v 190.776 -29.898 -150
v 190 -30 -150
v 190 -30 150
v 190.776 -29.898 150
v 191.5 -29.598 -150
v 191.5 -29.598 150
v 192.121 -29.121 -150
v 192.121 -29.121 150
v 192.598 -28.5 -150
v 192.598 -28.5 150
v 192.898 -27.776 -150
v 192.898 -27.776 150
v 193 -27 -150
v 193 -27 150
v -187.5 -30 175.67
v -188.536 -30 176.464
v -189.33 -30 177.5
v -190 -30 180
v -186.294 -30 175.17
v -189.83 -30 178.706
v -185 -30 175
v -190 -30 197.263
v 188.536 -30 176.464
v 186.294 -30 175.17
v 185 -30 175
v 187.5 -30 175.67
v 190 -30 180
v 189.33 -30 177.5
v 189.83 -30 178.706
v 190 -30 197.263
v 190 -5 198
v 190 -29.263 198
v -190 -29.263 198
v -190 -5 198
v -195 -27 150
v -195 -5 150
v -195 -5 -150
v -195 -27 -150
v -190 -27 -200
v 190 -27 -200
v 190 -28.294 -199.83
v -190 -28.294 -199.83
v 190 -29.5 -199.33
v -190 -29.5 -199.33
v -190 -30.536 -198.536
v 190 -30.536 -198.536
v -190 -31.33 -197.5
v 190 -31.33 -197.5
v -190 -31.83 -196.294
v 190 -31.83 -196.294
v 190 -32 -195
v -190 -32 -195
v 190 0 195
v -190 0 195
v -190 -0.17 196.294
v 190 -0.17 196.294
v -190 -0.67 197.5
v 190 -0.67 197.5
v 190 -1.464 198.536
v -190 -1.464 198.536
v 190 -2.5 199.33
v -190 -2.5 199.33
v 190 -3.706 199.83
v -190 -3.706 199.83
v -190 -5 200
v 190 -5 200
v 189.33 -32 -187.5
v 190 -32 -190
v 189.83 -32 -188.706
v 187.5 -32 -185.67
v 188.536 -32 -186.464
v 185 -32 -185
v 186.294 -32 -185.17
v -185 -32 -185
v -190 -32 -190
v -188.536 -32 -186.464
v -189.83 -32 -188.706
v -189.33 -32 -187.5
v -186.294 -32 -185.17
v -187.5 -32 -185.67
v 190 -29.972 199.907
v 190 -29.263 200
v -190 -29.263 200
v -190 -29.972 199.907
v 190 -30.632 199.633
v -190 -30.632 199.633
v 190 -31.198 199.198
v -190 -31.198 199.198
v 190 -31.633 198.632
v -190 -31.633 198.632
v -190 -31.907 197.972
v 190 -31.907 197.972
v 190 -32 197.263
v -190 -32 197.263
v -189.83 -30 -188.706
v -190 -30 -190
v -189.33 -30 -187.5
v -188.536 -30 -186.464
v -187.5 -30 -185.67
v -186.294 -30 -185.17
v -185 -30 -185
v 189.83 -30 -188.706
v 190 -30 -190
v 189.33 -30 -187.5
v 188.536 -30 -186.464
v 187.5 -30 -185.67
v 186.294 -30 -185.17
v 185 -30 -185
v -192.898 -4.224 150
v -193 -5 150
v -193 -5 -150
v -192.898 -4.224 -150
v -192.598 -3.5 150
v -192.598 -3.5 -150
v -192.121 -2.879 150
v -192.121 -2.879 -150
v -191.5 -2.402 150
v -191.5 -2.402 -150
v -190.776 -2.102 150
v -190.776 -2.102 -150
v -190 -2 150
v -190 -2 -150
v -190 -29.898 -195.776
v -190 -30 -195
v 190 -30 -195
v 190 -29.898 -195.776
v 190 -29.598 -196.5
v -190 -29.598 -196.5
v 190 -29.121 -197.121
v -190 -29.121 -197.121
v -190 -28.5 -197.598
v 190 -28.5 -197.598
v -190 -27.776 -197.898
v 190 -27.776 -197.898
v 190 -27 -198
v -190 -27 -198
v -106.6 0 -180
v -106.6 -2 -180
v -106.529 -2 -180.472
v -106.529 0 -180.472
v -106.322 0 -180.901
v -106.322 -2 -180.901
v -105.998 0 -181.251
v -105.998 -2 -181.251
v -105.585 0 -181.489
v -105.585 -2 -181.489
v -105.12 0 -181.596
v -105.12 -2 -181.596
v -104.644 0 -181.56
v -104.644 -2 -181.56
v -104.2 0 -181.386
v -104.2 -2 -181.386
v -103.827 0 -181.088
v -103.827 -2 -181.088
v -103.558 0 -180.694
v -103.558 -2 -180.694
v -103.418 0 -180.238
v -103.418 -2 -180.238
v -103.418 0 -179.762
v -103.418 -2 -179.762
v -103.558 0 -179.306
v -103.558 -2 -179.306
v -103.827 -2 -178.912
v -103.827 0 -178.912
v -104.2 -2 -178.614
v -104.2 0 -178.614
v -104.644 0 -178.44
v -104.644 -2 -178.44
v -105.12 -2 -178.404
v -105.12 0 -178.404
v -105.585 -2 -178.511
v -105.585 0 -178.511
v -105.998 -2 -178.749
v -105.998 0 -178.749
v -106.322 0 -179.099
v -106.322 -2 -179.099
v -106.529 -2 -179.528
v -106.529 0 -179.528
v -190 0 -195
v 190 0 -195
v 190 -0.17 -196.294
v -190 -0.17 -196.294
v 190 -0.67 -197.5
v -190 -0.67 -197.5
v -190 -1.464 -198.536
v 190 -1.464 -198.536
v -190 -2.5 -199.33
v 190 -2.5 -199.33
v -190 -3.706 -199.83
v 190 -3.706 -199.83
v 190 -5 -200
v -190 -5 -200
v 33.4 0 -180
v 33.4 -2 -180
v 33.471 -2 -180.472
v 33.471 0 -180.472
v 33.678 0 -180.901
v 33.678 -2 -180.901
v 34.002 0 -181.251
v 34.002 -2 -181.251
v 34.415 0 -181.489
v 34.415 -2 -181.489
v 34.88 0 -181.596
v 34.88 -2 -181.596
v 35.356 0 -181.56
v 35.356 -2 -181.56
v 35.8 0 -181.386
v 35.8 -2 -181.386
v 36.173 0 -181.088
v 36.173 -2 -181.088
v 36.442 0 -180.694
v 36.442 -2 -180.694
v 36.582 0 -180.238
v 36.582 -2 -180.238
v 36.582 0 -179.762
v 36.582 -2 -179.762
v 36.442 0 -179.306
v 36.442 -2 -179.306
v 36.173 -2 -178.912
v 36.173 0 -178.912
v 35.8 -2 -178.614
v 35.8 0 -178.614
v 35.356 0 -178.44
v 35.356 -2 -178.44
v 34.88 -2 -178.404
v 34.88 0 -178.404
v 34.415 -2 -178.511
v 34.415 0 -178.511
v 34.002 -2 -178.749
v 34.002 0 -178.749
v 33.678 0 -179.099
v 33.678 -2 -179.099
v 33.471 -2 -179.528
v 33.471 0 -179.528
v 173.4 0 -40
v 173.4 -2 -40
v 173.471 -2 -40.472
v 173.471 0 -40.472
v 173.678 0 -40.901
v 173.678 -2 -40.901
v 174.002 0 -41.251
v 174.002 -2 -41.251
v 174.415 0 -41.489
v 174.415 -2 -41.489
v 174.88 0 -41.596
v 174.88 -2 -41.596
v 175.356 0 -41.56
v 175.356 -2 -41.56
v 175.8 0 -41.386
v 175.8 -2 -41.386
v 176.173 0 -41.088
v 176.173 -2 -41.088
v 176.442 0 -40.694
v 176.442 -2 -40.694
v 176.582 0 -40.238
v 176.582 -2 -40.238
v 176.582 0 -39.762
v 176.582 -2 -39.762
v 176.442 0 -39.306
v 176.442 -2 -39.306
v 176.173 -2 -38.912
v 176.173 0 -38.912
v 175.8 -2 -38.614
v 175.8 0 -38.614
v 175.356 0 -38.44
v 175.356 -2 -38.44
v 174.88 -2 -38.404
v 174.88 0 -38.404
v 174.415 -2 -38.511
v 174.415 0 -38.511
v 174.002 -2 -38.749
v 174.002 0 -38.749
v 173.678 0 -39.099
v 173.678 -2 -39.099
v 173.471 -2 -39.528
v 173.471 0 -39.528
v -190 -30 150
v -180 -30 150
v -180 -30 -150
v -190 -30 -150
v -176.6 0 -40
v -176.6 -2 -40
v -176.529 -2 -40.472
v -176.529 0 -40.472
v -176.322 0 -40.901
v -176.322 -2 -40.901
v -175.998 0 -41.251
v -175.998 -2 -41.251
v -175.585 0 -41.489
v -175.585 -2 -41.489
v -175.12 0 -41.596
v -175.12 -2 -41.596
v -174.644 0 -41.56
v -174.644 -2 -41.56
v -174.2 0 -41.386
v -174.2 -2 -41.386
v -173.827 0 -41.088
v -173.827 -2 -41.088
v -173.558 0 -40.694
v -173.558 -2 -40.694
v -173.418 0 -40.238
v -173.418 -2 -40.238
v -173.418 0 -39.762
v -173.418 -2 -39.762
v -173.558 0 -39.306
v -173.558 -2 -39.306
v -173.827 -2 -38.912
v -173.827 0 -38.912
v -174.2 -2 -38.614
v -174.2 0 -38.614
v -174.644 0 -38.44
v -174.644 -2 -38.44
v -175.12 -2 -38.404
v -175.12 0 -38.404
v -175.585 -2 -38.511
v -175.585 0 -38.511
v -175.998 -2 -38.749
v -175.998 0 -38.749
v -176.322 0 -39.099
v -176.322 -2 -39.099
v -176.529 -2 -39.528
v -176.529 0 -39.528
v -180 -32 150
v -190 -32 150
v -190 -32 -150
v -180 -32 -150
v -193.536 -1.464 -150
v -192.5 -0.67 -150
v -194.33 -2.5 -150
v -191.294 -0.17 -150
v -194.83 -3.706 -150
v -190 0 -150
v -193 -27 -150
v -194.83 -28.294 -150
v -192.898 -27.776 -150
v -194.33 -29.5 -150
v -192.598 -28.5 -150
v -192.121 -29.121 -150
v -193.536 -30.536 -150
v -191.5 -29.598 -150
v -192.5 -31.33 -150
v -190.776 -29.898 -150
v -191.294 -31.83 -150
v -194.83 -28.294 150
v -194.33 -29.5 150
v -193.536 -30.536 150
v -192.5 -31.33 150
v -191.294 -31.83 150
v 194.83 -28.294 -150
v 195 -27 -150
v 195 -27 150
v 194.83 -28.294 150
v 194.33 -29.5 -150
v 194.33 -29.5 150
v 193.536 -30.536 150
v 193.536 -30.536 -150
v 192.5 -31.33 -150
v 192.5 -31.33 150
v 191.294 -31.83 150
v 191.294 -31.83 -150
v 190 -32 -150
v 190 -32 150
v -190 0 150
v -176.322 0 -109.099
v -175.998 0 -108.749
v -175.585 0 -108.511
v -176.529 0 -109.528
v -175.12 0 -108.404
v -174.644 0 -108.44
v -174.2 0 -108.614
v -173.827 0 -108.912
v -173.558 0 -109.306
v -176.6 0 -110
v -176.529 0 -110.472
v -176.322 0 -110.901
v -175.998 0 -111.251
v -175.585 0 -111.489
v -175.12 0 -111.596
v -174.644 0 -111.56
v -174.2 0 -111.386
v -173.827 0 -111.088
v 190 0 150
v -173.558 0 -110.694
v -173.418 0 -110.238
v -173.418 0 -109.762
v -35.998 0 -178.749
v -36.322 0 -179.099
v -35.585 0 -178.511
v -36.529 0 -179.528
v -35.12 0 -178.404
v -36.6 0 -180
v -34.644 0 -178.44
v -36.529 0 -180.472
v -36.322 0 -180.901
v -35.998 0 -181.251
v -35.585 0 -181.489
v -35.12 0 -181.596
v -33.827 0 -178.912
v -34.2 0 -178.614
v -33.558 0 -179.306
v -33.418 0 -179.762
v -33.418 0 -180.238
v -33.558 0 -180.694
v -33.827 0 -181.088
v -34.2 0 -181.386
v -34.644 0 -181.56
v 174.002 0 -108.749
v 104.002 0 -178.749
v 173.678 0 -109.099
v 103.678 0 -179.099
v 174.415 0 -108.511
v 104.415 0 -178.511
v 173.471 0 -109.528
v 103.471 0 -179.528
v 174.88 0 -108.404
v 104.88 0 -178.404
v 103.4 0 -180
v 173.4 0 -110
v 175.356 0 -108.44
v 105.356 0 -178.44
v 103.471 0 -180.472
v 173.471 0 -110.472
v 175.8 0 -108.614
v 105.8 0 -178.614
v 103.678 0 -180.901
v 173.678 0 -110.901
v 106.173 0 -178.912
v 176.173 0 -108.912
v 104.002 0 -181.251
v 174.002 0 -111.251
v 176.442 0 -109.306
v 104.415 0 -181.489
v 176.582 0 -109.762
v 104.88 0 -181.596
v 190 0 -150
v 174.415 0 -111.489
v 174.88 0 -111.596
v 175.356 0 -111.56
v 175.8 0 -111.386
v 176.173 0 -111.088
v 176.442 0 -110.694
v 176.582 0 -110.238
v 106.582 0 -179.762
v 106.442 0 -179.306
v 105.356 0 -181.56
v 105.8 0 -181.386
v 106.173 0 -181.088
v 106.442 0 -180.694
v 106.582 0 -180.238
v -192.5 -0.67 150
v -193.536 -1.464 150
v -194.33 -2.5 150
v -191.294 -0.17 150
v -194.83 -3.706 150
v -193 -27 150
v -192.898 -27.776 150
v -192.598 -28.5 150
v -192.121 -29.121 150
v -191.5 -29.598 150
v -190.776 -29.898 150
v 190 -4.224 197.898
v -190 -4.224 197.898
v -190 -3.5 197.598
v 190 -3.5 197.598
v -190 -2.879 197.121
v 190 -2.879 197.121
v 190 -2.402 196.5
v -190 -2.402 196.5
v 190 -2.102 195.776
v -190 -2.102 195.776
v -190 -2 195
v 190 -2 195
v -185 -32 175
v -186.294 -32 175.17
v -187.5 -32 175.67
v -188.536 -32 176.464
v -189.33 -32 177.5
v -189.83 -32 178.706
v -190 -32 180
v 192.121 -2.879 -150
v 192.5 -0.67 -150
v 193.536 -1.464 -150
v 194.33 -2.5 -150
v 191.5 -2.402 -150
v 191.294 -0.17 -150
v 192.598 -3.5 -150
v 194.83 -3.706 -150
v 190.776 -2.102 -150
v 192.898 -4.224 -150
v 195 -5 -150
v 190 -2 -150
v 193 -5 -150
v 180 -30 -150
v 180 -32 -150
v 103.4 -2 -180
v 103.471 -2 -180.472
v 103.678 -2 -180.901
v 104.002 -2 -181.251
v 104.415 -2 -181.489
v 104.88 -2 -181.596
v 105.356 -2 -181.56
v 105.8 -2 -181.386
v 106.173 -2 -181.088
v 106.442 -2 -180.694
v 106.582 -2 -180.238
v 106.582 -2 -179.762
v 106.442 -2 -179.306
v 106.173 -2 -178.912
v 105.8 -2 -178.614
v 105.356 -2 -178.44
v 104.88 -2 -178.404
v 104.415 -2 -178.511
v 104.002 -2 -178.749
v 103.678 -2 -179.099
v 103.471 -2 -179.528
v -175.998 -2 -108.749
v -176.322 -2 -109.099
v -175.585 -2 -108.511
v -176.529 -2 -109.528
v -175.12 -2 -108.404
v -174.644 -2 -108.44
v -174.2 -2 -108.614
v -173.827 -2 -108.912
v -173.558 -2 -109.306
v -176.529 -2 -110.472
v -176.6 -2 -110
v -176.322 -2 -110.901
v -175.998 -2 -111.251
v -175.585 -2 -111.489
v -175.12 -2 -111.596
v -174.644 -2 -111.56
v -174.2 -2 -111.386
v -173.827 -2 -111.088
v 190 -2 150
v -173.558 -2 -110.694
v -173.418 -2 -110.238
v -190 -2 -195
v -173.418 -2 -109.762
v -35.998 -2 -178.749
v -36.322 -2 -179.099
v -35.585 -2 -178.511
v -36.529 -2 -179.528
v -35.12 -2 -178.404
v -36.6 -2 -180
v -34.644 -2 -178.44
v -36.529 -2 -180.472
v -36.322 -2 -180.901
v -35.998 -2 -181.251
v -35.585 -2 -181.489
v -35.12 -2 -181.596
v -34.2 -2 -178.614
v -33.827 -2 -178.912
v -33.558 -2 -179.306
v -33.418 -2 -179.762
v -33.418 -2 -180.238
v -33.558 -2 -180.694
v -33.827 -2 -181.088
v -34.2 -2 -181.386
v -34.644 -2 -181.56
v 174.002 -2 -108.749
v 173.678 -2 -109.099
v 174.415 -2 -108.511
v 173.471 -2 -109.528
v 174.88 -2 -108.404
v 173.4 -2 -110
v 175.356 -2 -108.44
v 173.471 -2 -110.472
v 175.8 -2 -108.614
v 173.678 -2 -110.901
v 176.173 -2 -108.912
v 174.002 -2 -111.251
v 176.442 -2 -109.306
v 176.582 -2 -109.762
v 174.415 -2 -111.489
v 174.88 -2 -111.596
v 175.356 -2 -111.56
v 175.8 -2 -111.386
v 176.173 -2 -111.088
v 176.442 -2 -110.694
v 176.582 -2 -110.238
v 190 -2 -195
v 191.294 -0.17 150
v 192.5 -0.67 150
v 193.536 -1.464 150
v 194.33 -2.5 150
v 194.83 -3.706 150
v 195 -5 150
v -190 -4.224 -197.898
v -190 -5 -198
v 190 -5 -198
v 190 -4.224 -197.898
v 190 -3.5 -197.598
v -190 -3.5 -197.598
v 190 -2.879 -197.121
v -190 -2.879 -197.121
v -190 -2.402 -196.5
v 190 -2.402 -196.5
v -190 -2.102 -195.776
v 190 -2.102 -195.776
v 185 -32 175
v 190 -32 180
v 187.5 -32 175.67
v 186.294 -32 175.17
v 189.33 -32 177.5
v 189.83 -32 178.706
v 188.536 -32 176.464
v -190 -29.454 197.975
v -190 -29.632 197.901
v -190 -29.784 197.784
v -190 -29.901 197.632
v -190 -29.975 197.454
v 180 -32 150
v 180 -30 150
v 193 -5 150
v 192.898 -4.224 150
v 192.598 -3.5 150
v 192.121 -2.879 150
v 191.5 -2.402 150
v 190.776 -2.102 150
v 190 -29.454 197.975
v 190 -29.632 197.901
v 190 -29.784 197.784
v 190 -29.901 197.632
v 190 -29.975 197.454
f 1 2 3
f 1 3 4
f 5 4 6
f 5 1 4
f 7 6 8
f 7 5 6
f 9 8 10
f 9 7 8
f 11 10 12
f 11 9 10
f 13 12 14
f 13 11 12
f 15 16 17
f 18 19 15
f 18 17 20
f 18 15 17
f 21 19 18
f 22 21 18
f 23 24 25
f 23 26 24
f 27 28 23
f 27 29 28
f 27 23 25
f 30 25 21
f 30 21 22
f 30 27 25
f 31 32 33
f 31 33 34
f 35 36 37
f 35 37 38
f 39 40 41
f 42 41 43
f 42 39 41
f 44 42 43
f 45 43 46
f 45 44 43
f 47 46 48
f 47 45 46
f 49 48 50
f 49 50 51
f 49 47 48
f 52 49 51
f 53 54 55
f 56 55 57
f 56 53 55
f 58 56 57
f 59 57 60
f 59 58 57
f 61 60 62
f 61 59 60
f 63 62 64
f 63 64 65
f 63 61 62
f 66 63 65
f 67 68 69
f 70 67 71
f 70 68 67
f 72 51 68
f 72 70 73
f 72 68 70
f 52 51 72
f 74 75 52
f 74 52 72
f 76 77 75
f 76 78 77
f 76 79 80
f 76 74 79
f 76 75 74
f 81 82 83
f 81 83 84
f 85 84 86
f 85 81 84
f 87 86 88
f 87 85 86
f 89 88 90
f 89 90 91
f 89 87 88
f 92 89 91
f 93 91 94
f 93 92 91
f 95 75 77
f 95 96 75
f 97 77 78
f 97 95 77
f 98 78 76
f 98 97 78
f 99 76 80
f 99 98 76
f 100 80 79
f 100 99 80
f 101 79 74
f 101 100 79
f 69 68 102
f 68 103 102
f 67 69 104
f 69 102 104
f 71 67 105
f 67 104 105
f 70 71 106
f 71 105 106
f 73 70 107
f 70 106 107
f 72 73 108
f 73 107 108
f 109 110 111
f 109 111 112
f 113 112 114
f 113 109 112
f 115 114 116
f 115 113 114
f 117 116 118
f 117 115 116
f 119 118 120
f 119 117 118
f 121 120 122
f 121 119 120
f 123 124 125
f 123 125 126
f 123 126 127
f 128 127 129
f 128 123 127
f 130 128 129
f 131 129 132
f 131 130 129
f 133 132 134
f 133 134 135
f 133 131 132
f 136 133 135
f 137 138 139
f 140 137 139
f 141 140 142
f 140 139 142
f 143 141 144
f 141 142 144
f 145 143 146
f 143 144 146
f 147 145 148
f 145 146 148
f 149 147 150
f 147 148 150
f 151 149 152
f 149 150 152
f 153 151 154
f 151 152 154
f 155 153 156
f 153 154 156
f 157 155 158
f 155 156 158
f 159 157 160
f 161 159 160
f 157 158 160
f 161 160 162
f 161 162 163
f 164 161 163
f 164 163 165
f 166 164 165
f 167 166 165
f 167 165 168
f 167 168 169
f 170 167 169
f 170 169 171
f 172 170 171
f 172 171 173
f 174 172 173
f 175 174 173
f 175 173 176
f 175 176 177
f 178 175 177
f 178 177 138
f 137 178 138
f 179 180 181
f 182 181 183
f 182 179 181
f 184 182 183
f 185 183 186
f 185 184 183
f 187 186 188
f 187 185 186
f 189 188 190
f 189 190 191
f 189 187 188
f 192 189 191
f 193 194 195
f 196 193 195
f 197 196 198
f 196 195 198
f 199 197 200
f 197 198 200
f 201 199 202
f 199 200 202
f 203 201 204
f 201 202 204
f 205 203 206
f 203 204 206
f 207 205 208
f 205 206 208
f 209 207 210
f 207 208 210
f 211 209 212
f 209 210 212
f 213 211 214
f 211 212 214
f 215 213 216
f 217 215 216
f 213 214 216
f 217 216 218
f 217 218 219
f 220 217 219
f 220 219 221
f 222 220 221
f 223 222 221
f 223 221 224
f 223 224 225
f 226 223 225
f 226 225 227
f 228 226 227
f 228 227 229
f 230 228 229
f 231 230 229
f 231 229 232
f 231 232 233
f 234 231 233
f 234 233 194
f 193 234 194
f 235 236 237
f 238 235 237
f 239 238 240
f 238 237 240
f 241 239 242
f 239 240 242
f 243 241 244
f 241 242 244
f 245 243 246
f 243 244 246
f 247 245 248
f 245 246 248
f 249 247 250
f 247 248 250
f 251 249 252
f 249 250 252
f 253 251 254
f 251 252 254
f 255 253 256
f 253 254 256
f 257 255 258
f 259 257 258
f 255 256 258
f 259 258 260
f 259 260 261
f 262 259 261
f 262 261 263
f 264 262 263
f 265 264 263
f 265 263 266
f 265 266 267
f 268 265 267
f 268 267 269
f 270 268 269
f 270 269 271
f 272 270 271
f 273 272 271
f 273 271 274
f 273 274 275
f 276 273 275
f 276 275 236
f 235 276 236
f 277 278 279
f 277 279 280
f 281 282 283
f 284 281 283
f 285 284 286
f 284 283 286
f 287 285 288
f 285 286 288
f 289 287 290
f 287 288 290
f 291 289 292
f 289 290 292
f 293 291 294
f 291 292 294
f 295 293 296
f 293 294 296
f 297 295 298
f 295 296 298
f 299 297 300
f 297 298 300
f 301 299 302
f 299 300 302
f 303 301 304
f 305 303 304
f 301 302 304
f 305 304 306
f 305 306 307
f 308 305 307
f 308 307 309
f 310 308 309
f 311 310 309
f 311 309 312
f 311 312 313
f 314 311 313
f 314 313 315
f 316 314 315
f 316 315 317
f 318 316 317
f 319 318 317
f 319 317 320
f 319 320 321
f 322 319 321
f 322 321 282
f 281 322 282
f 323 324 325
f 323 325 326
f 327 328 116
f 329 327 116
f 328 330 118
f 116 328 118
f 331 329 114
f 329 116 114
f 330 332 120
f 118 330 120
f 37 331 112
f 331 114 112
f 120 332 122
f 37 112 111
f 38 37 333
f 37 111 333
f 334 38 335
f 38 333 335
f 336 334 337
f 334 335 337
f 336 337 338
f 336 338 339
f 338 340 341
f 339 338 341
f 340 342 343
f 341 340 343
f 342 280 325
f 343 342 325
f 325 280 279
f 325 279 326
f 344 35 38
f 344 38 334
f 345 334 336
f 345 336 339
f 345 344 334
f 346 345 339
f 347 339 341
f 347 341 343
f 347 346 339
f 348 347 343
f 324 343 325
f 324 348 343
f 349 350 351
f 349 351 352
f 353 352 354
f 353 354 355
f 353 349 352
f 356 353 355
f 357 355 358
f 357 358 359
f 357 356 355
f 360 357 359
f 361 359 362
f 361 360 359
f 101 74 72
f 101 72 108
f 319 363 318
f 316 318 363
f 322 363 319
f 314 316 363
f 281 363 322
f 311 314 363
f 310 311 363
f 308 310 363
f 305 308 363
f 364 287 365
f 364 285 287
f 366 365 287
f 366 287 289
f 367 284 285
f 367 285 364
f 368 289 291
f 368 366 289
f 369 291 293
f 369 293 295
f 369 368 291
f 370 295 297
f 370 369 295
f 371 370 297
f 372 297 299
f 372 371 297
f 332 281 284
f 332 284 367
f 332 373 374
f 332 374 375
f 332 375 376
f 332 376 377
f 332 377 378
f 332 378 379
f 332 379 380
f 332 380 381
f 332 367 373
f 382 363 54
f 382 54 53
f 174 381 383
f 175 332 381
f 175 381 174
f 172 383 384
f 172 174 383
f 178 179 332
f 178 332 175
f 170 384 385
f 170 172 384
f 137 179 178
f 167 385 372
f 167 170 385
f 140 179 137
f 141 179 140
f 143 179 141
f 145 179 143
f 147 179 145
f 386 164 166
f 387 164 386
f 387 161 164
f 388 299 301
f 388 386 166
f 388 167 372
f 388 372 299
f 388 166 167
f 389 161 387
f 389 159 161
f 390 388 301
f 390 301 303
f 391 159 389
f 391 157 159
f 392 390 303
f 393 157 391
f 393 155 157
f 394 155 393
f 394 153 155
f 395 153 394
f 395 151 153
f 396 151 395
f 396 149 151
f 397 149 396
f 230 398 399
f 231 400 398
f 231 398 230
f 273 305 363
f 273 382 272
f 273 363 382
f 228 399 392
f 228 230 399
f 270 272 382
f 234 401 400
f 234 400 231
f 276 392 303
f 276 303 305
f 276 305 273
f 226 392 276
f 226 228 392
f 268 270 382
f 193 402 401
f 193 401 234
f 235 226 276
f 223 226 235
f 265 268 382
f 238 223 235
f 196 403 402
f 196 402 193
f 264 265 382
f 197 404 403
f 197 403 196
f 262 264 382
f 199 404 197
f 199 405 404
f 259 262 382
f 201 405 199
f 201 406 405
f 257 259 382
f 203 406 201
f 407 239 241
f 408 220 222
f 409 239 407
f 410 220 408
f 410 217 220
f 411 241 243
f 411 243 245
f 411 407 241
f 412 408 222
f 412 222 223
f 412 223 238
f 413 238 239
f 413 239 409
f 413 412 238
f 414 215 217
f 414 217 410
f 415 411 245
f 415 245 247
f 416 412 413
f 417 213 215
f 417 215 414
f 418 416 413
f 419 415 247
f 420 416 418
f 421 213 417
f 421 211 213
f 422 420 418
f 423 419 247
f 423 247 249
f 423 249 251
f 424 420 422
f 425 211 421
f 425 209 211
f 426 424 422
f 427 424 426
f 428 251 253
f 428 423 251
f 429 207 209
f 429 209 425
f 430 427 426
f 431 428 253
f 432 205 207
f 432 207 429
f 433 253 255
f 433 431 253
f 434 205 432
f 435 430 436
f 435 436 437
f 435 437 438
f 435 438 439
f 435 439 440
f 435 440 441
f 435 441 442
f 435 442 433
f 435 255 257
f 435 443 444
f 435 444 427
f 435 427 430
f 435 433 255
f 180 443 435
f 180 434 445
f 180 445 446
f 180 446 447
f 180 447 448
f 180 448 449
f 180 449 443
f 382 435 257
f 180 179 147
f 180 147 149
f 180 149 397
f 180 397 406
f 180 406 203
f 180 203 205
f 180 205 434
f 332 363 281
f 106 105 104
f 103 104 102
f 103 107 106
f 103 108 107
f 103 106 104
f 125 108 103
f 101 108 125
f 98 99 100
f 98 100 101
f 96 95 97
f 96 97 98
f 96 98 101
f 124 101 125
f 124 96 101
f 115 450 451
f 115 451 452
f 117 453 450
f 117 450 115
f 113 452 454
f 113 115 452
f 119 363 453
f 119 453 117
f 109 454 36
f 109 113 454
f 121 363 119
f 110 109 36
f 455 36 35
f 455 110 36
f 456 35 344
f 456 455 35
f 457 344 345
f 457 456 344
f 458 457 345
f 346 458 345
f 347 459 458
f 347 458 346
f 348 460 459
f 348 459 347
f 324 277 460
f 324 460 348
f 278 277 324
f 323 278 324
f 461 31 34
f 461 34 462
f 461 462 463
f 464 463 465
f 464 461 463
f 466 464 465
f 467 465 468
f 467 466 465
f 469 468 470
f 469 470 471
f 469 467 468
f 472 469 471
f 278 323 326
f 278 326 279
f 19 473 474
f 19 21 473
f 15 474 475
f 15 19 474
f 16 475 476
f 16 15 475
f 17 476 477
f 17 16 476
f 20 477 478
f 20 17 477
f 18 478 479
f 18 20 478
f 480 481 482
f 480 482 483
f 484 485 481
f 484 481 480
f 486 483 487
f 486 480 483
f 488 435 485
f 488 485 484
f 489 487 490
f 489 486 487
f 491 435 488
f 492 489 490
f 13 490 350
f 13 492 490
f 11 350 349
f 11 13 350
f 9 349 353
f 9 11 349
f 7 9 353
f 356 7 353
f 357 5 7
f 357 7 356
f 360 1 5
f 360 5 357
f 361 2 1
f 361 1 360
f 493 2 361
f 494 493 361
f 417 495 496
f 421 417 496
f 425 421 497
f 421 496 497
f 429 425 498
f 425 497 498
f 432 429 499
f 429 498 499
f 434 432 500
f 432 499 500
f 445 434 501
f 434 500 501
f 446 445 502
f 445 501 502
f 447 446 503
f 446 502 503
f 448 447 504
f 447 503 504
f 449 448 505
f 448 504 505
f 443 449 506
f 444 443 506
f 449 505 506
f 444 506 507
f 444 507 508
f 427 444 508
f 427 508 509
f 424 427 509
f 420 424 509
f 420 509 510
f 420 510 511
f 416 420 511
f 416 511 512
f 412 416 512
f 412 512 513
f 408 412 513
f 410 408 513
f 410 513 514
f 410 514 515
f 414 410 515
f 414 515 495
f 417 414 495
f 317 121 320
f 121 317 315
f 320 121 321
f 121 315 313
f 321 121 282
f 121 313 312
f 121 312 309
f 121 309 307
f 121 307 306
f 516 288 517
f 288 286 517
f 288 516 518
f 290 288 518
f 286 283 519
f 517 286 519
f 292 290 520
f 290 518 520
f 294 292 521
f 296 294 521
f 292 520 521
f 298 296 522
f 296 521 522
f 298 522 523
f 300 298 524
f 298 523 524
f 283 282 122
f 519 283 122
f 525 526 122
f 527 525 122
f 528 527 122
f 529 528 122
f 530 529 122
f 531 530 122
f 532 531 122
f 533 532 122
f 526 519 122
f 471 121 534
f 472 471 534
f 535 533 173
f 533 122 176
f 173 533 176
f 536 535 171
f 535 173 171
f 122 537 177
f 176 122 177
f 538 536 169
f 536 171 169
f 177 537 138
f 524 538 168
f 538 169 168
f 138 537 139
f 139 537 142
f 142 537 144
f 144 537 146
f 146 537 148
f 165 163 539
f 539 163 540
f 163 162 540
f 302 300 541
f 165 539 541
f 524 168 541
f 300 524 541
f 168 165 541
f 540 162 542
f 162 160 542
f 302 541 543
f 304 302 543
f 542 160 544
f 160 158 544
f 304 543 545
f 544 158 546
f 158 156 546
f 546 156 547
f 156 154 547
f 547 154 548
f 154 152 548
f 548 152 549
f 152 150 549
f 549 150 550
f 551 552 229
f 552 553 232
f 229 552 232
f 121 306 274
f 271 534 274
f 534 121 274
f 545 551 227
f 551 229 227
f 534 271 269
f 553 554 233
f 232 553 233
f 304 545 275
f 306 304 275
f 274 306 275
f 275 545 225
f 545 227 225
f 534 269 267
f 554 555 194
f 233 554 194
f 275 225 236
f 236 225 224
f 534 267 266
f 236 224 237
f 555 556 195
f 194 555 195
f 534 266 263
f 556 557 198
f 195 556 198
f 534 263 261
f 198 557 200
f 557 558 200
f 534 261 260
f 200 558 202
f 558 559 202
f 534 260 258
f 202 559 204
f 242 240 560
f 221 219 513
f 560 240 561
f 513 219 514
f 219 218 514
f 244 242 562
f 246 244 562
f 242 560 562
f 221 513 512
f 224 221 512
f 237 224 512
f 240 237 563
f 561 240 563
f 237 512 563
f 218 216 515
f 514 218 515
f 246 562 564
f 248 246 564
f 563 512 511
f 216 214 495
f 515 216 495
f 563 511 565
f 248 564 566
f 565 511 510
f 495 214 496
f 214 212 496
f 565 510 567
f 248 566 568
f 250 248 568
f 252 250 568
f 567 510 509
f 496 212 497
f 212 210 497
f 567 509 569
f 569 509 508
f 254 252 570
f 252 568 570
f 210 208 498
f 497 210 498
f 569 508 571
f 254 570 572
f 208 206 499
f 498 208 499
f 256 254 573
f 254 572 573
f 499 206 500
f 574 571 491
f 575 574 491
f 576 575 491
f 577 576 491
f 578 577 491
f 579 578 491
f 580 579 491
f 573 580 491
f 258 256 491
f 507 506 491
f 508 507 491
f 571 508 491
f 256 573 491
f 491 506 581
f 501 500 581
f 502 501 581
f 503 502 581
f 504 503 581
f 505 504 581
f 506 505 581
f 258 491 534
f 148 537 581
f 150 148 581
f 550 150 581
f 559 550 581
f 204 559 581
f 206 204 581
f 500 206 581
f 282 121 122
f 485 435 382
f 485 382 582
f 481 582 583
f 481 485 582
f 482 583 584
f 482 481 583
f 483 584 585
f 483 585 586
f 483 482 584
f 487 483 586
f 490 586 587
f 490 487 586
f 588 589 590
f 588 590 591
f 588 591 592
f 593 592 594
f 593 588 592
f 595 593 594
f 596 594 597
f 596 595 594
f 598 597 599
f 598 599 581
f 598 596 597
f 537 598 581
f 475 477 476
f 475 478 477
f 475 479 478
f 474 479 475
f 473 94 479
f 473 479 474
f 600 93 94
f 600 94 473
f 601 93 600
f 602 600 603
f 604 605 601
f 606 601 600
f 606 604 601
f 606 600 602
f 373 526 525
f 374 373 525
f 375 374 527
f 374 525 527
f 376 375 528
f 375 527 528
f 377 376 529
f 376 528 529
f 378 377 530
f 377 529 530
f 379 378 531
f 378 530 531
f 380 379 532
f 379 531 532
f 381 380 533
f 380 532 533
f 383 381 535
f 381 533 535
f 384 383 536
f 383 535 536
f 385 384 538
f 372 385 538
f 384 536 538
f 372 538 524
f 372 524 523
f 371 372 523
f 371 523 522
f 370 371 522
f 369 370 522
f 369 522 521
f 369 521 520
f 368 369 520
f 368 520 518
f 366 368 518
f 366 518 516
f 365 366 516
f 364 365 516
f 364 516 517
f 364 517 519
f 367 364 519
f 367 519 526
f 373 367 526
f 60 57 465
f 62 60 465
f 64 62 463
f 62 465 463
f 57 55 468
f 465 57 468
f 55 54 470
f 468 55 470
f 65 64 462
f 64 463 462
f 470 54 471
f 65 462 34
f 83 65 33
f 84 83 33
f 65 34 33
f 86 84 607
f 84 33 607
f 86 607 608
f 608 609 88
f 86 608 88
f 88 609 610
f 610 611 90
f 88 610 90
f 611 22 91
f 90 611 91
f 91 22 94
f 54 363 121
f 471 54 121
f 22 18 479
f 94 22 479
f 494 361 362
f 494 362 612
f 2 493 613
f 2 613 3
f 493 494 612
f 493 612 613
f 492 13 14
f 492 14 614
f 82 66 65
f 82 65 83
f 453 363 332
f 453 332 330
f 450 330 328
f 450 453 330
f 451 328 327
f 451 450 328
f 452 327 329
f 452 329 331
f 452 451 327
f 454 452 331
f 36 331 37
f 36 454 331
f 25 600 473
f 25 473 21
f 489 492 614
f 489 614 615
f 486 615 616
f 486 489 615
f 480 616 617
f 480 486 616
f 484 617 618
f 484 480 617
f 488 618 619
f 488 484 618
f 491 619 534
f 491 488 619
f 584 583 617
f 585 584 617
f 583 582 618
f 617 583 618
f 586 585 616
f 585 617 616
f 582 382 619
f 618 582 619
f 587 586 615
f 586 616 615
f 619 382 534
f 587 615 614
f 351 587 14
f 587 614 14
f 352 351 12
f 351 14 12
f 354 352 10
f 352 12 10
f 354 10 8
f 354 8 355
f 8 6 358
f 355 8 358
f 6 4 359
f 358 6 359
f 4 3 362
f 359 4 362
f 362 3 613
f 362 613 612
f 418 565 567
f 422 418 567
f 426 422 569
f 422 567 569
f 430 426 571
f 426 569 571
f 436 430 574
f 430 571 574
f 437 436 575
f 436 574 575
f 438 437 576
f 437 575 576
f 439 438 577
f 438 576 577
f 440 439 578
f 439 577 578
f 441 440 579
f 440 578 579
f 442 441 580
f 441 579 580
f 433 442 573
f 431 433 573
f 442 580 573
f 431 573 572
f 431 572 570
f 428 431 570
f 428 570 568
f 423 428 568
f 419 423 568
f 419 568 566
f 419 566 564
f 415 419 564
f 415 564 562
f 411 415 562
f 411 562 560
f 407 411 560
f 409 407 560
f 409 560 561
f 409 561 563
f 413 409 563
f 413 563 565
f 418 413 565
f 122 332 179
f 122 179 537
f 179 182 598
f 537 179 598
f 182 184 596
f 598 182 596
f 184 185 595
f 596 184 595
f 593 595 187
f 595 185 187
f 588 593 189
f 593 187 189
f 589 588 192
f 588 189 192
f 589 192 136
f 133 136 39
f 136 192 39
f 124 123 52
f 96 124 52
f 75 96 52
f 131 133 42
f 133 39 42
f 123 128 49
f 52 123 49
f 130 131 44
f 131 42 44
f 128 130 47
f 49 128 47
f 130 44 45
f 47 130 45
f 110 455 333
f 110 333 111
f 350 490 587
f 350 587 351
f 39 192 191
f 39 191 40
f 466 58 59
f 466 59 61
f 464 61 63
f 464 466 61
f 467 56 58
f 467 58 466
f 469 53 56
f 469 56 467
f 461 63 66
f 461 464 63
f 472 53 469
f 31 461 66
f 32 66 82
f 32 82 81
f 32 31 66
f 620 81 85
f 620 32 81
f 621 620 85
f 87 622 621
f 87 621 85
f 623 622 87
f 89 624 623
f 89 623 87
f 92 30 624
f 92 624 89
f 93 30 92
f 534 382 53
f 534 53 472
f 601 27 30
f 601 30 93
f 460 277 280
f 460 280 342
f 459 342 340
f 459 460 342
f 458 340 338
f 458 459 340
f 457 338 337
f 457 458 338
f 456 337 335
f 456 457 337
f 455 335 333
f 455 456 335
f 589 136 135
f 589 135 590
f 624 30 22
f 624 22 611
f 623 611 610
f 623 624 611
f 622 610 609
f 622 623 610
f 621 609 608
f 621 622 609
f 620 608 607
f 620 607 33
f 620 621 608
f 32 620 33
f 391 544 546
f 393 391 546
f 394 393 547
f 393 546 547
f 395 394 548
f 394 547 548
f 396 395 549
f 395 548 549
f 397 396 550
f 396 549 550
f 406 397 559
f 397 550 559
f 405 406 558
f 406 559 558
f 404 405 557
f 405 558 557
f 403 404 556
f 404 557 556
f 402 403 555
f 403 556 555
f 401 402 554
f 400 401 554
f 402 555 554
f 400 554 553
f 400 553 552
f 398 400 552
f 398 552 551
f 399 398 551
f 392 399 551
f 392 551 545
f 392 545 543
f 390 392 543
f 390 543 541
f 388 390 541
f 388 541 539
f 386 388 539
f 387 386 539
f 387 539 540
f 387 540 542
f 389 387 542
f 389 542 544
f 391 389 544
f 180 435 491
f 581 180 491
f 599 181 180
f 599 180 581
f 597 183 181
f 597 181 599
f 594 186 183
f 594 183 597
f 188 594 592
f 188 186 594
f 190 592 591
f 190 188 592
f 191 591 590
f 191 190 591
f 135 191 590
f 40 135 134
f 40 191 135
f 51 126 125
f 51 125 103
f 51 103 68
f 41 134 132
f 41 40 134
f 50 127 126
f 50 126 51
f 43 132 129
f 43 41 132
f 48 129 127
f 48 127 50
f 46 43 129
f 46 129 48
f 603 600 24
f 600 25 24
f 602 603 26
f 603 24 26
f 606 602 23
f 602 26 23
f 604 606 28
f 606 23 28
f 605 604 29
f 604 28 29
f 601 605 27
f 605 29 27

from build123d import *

# Parameters (mm, degrees)
SKETCH1_W                     = 380
SKETCH1_H                     = 390
BASE_FLANGE1_DEPTH            = 2
EDGE_FLANGE3_DEPTH            = 380
EDGE_FLANGE11_DEPTH           = 380
EDGE_FLANGE12_STRIP_W         = 14
EDGE_FLANGE12_STRIP_H         = 2
EDGE_FLANGE12_STRIP_CUT_DEPTH = 380
EDGE_FLANGE12_DEPTH           = 380
EDGE_FLANGE13_STRIP_W         = 9.4732
EDGE_FLANGE13_STRIP_H         = 2
EDGE_FLANGE13_STRIP_CUT_DEPTH = 380
EDGE_FLANGE13_DEPTH           = 380
F_1_0MM_DOWEL_HOLE2_D         = 3.2
FILLET1_R                     = 5
EDGE_FLANGE14_DEPTH           = 300
EDGE_FLANGE15_DEPTH           = 300
EDGE_FLANGE16_STRIP_W         = 14
EDGE_FLANGE16_STRIP_H         = 2
EDGE_FLANGE16_STRIP_CUT_DEPTH = 300
EDGE_FLANGE16_DEPTH           = 300
EDGE_FLANGE17_STRIP_W         = 14
EDGE_FLANGE17_STRIP_H         = 2
EDGE_FLANGE17_STRIP_CUT_DEPTH = 300
EDGE_FLANGE17_DEPTH           = 300


# Sheet-metal steps are written as plain solids
with BuildPart() as part:
    # Sketch1 → Base-Flange1 (new body)
    with BuildSketch(Plane(origin=(0, 0, 0), x_dir=(1, 0, 0), z_dir=(0, 1, 0))):
        Rectangle(SKETCH1_W, SKETCH1_H)
    extrude(amount=-BASE_FLANGE1_DEPTH)

    # Edge-Flange3 section (across the edge) → Edge-Flange3 (add)
    with BuildSketch(Plane(origin=(-190, -2, -198), x_dir=(0, 0, 1), z_dir=(1, 0, 0))):
        with BuildLine():
            Line((-2, 3), (-2, 28))
            Line((-2, 28), (0, 28))
            Line((0, 28), (0, 3))
            ThreePointArc((0, 3), (0.878679656, 0.878679656), (3, 0))
            Line((3, 0), (3, -2))
            ThreePointArc((3, -2), (-0.535533906, -0.535533906), (-2, 3))
        make_face()
    extrude(amount=EDGE_FLANGE3_DEPTH)

    # Edge-Flange11 section (across the edge) → Edge-Flange11 (add)
    with BuildSketch(Plane(origin=(190, -2, 198), x_dir=(0, 0, -1), z_dir=(-1, 0, 0))):
        with BuildLine():
            Line((-2, 3), (-2, 28))
            Line((-2, 28), (0, 28))
            Line((0, 28), (0, 3))
            ThreePointArc((0, 3), (0.878679656, 0.878679656), (3, 0))
            Line((3, 0), (3, -2))
            ThreePointArc((3, -2), (-0.535533906, -0.535533906), (-2, 3))
        make_face()
    extrude(amount=EDGE_FLANGE11_DEPTH)

    # Edge-Flange12 strip (across the edge) → Edge-Flange12 strip cut (cut)
    with BuildSketch(Plane(origin=(-190, -30, -198), x_dir=(0, 1, 0), z_dir=(1, 0, 0))):
        with Locations((-4, -1)):
            Rectangle(EDGE_FLANGE12_STRIP_W, EDGE_FLANGE12_STRIP_H)
    extrude(amount=EDGE_FLANGE12_STRIP_CUT_DEPTH, mode=Mode.SUBTRACT)

    # Edge-Flange12 section (across the edge) → Edge-Flange12 (add)
    with BuildSketch(Plane(origin=(-190, -30, -198), x_dir=(0, 1, 0), z_dir=(1, 0, 0))):
        with BuildLine():
            Line((-2, 3), (-2, 13))
            Line((-2, 13), (0, 13))
            Line((0, 13), (0, 3))
            ThreePointArc((0, 3), (0.878679656, 0.878679656), (3, 0))
            Line((3, 0), (3, -2))
            ThreePointArc((3, -2), (-0.535533906, -0.535533906), (-2, 3))
        make_face()
    extrude(amount=EDGE_FLANGE12_DEPTH)

    # Edge-Flange13 strip (across the edge) → Edge-Flange13 strip cut (cut)
    with BuildSketch(Plane(origin=(190, -30, 198), x_dir=(0, 1, 0), z_dir=(-1, 0, 0))):
        with Locations((-4, -1)):
            Rectangle(EDGE_FLANGE13_STRIP_W, EDGE_FLANGE13_STRIP_H)
    extrude(amount=EDGE_FLANGE13_STRIP_CUT_DEPTH, mode=Mode.SUBTRACT)

    # Edge-Flange13 section (across the edge) → Edge-Flange13 (add)
    with BuildSketch(Plane(origin=(190, -30, 198), x_dir=(0, 1, 0), z_dir=(-1, 0, 0))):
        with BuildLine():
            Line((-2, 0.7366), (-2, 23))
            Line((-2, 23), (0, 23))
            Line((0, 23), (0, 0.7366))
            ThreePointArc((0, 0.7366), (0.215745145, 0.215745145), (0.7366, 0))
            Line((0.7366, 0), (0.7366, -2))
            ThreePointArc((0.7366, -2), (-1.198468417, -1.198468417), (-2, 0.7366))
        make_face()
    extrude(amount=EDGE_FLANGE13_DEPTH)

    # Ø1.0mm Dowel Hole2 (through all)
    with Locations(Plane(origin=(0, 0, 0), x_dir=(1, 0, 0), z_dir=(0, 1, 0))):
        with Locations((-175, 40), (-175, 110), (-105, 180), (-35, 180), (35, 180), (175, 110), (175, 40), (105, 180)):
            Hole(F_1_0MM_DOWEL_HOLE2_D / 2)

    # Fillet1
    fillet1_edges = [part.edges().sort_by_distance(p)[0] for p in [
        (190, -31, 175),
        (-190, -31, 175),
        (-190, -31, -185),
        (190, -31, -185),
    ]]
    fillet(fillet1_edges, radius=FILLET1_R)

    # Edge-Flange14 section (across the edge) → Edge-Flange14 (add)
    with BuildSketch(Plane(origin=(193, -2, -150), x_dir=(-1, 0, 0), z_dir=(0, 0, 1))):
        with BuildLine():
            Line((-2, 3), (-2, 30))
            Line((-2, 30), (0, 30))
            Line((0, 30), (0, 3))
            ThreePointArc((0, 3), (0.878679656, 0.878679656), (3, 0))
            Line((3, 0), (3, -2))
            ThreePointArc((3, -2), (-0.535533906, -0.535533906), (-2, 3))
        make_face()
    extrude(amount=EDGE_FLANGE14_DEPTH)

    # Edge-Flange15 section (across the edge) → Edge-Flange15 (add)
    with BuildSketch(Plane(origin=(-193, -2, 150), x_dir=(1, 0, 0), z_dir=(0, 0, -1))):
        with BuildLine():
            Line((-2, 3), (-2, 30))
            Line((-2, 30), (0, 30))
            Line((0, 30), (0, 3))
            ThreePointArc((0, 3), (0.878679656, 0.878679656), (3, 0))
            Line((3, 0), (3, -2))
            ThreePointArc((3, -2), (-0.535533906, -0.535533906), (-2, 3))
        make_face()
    extrude(amount=EDGE_FLANGE15_DEPTH)

    # Edge-Flange16 strip (across the edge) → Edge-Flange16 strip cut (cut)
    with BuildSketch(Plane(origin=(193, -32, -150), x_dir=(0, 1, 0), z_dir=(0, 0, 1))):
        with Locations((-2, -1)):
            Rectangle(EDGE_FLANGE16_STRIP_W, EDGE_FLANGE16_STRIP_H)
    extrude(amount=EDGE_FLANGE16_STRIP_CUT_DEPTH, mode=Mode.SUBTRACT)

    # Edge-Flange16 section (across the edge) → Edge-Flange16 (add)
    with BuildSketch(Plane(origin=(193, -32, -150), x_dir=(0, 1, 0), z_dir=(0, 0, 1))):
        with BuildLine():
            Line((0, 3), (0, 13))
            Line((0, 13), (2, 13))
            Line((2, 13), (2, 3))
            ThreePointArc((2, 3), (2.878679656, 0.878679656), (5, 0))
            Line((5, 0), (5, -2))
            ThreePointArc((5, -2), (1.464466094, -0.535533906), (0, 3))
        make_face()
    extrude(amount=EDGE_FLANGE16_DEPTH)

    # Edge-Flange17 strip (across the edge) → Edge-Flange17 strip cut (cut)
    with BuildSketch(Plane(origin=(-193, -32, 150), x_dir=(0, 1, 0), z_dir=(0, 0, -1))):
        with Locations((-2, -1)):
            Rectangle(EDGE_FLANGE17_STRIP_W, EDGE_FLANGE17_STRIP_H)
    extrude(amount=EDGE_FLANGE17_STRIP_CUT_DEPTH, mode=Mode.SUBTRACT)

    # Edge-Flange17 section (across the edge) → Edge-Flange17 (add)
    with BuildSketch(Plane(origin=(-193, -32, 150), x_dir=(0, 1, 0), z_dir=(0, 0, -1))):
        with BuildLine():
            Line((0, 3), (0, 13))
            Line((0, 13), (2, 13))
            Line((2, 13), (2, 3))
            ThreePointArc((2, 3), (2.878679656, 0.878679656), (5, 0))
            Line((5, 0), (5, -2))
            ThreePointArc((5, -2), (1.464466094, -0.535533906), (0, 3))
        make_face()
    extrude(amount=EDGE_FLANGE17_DEPTH)


solid = part.part
